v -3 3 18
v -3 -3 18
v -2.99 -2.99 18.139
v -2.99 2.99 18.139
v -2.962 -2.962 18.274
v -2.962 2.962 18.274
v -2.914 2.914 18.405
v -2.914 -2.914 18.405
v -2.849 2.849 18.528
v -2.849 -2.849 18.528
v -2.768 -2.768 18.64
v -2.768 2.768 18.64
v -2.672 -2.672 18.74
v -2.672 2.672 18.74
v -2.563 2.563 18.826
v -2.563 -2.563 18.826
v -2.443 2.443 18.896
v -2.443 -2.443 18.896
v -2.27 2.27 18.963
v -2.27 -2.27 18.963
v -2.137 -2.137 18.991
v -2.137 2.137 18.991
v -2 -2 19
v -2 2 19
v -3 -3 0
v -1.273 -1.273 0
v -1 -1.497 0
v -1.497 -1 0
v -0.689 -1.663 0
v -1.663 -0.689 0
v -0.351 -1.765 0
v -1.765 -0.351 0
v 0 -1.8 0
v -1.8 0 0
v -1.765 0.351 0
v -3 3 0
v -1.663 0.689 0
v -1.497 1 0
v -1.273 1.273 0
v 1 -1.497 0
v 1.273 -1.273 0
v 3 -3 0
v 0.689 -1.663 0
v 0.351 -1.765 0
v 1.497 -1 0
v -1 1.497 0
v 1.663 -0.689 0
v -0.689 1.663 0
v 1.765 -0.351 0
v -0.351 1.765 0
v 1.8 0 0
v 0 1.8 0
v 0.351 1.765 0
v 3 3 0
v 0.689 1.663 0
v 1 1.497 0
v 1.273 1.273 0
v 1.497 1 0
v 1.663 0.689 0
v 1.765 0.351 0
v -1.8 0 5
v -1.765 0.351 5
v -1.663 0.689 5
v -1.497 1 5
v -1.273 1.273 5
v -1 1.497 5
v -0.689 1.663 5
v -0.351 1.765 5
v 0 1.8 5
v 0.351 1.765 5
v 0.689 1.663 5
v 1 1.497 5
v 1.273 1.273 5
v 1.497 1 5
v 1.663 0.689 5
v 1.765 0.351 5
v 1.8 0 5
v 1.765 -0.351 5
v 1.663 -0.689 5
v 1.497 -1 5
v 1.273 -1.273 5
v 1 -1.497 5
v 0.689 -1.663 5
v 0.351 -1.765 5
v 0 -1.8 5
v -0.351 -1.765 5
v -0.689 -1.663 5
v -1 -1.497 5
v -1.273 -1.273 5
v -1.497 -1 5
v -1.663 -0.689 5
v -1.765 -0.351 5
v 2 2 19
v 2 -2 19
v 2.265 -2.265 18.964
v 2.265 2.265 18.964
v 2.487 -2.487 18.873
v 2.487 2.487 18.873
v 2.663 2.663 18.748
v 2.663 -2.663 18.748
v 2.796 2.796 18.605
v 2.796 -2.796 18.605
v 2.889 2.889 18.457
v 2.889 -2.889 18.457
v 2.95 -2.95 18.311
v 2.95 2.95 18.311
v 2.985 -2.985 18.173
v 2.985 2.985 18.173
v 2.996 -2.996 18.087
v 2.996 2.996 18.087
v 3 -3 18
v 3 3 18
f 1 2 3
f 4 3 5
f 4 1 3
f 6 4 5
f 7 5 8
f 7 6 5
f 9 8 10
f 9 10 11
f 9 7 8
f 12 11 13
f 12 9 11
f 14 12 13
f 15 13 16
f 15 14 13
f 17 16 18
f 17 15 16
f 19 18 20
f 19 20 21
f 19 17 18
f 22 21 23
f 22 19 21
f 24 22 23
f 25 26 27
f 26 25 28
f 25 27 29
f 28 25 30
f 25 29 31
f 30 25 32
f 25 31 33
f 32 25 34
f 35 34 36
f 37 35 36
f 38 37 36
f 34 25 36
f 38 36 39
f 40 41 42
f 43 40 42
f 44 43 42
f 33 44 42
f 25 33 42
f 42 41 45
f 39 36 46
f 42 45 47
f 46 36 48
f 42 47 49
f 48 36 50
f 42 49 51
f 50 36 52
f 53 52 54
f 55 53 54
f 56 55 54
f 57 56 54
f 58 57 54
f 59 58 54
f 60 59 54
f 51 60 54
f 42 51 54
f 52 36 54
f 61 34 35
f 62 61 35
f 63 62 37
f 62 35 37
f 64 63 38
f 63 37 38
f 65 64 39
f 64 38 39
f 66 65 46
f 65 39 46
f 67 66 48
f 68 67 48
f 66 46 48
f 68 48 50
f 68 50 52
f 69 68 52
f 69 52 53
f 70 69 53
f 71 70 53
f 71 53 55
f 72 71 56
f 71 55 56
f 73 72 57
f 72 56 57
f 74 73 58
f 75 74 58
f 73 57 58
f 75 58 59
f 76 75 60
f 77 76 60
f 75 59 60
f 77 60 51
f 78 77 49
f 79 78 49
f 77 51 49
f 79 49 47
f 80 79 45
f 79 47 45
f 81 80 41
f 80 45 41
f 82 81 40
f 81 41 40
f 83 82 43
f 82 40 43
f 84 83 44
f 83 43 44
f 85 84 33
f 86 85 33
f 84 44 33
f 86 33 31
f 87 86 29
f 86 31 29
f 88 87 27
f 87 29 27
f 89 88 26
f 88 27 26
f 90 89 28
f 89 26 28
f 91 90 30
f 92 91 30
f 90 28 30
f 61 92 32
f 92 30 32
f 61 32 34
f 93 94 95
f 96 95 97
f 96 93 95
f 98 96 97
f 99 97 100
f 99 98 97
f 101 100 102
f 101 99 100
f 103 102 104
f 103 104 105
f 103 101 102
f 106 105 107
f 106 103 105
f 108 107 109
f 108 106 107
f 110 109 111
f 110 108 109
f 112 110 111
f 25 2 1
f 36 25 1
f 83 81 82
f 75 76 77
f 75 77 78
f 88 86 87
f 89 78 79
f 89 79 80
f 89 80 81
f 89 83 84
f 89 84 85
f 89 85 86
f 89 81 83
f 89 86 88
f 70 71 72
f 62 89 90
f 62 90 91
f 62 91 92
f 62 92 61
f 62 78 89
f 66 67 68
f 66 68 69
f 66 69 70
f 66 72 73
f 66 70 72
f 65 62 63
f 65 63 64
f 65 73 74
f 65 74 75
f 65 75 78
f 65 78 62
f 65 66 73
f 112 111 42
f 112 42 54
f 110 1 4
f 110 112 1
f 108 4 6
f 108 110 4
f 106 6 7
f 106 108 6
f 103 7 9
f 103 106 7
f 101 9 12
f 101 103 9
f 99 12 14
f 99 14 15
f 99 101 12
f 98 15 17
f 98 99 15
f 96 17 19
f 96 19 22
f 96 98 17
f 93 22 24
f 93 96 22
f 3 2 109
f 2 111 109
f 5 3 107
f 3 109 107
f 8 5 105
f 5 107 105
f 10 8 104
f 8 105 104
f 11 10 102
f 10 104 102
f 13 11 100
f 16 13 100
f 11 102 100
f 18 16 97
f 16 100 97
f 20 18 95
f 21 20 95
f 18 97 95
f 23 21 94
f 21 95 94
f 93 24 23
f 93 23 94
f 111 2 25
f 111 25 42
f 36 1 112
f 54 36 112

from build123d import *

# Parameters (mm, degrees)
SKETCH1_W           = 6
SKETCH1_H           = 6
BOSS_EXTRUDE1_DEPTH = 19
SKETCH2_R           = 1.8
CUT_EXTRUDE1_DEPTH  = 5
FILLET1_R           = 1


with BuildPart() as part:
    # Sketch1 → Boss-Extrude1 (new body)
    with BuildSketch(Plane.XY):
        Rectangle(SKETCH1_W, SKETCH1_H)
    extrude(amount=BOSS_EXTRUDE1_DEPTH)

    # Sketch2 → Cut-Extrude1 (cut)
    with BuildSketch(Plane(origin=(0, 0, 0), x_dir=(-1, 0, 0), z_dir=(0, 0, -1))):
        Circle(SKETCH2_R)
    extrude(amount=-CUT_EXTRUDE1_DEPTH, mode=Mode.SUBTRACT)

    # Fillet1
    fillet1_edges = [part.edges().sort_by_distance(p)[0] for p in [
        (3, 0, 19),
        (0, 3, 19),
        (-3, 0, 19),
        (0, -3, 19),
    ]]
    fillet(fillet1_edges, radius=FILLET1_R)


solid = part.part
